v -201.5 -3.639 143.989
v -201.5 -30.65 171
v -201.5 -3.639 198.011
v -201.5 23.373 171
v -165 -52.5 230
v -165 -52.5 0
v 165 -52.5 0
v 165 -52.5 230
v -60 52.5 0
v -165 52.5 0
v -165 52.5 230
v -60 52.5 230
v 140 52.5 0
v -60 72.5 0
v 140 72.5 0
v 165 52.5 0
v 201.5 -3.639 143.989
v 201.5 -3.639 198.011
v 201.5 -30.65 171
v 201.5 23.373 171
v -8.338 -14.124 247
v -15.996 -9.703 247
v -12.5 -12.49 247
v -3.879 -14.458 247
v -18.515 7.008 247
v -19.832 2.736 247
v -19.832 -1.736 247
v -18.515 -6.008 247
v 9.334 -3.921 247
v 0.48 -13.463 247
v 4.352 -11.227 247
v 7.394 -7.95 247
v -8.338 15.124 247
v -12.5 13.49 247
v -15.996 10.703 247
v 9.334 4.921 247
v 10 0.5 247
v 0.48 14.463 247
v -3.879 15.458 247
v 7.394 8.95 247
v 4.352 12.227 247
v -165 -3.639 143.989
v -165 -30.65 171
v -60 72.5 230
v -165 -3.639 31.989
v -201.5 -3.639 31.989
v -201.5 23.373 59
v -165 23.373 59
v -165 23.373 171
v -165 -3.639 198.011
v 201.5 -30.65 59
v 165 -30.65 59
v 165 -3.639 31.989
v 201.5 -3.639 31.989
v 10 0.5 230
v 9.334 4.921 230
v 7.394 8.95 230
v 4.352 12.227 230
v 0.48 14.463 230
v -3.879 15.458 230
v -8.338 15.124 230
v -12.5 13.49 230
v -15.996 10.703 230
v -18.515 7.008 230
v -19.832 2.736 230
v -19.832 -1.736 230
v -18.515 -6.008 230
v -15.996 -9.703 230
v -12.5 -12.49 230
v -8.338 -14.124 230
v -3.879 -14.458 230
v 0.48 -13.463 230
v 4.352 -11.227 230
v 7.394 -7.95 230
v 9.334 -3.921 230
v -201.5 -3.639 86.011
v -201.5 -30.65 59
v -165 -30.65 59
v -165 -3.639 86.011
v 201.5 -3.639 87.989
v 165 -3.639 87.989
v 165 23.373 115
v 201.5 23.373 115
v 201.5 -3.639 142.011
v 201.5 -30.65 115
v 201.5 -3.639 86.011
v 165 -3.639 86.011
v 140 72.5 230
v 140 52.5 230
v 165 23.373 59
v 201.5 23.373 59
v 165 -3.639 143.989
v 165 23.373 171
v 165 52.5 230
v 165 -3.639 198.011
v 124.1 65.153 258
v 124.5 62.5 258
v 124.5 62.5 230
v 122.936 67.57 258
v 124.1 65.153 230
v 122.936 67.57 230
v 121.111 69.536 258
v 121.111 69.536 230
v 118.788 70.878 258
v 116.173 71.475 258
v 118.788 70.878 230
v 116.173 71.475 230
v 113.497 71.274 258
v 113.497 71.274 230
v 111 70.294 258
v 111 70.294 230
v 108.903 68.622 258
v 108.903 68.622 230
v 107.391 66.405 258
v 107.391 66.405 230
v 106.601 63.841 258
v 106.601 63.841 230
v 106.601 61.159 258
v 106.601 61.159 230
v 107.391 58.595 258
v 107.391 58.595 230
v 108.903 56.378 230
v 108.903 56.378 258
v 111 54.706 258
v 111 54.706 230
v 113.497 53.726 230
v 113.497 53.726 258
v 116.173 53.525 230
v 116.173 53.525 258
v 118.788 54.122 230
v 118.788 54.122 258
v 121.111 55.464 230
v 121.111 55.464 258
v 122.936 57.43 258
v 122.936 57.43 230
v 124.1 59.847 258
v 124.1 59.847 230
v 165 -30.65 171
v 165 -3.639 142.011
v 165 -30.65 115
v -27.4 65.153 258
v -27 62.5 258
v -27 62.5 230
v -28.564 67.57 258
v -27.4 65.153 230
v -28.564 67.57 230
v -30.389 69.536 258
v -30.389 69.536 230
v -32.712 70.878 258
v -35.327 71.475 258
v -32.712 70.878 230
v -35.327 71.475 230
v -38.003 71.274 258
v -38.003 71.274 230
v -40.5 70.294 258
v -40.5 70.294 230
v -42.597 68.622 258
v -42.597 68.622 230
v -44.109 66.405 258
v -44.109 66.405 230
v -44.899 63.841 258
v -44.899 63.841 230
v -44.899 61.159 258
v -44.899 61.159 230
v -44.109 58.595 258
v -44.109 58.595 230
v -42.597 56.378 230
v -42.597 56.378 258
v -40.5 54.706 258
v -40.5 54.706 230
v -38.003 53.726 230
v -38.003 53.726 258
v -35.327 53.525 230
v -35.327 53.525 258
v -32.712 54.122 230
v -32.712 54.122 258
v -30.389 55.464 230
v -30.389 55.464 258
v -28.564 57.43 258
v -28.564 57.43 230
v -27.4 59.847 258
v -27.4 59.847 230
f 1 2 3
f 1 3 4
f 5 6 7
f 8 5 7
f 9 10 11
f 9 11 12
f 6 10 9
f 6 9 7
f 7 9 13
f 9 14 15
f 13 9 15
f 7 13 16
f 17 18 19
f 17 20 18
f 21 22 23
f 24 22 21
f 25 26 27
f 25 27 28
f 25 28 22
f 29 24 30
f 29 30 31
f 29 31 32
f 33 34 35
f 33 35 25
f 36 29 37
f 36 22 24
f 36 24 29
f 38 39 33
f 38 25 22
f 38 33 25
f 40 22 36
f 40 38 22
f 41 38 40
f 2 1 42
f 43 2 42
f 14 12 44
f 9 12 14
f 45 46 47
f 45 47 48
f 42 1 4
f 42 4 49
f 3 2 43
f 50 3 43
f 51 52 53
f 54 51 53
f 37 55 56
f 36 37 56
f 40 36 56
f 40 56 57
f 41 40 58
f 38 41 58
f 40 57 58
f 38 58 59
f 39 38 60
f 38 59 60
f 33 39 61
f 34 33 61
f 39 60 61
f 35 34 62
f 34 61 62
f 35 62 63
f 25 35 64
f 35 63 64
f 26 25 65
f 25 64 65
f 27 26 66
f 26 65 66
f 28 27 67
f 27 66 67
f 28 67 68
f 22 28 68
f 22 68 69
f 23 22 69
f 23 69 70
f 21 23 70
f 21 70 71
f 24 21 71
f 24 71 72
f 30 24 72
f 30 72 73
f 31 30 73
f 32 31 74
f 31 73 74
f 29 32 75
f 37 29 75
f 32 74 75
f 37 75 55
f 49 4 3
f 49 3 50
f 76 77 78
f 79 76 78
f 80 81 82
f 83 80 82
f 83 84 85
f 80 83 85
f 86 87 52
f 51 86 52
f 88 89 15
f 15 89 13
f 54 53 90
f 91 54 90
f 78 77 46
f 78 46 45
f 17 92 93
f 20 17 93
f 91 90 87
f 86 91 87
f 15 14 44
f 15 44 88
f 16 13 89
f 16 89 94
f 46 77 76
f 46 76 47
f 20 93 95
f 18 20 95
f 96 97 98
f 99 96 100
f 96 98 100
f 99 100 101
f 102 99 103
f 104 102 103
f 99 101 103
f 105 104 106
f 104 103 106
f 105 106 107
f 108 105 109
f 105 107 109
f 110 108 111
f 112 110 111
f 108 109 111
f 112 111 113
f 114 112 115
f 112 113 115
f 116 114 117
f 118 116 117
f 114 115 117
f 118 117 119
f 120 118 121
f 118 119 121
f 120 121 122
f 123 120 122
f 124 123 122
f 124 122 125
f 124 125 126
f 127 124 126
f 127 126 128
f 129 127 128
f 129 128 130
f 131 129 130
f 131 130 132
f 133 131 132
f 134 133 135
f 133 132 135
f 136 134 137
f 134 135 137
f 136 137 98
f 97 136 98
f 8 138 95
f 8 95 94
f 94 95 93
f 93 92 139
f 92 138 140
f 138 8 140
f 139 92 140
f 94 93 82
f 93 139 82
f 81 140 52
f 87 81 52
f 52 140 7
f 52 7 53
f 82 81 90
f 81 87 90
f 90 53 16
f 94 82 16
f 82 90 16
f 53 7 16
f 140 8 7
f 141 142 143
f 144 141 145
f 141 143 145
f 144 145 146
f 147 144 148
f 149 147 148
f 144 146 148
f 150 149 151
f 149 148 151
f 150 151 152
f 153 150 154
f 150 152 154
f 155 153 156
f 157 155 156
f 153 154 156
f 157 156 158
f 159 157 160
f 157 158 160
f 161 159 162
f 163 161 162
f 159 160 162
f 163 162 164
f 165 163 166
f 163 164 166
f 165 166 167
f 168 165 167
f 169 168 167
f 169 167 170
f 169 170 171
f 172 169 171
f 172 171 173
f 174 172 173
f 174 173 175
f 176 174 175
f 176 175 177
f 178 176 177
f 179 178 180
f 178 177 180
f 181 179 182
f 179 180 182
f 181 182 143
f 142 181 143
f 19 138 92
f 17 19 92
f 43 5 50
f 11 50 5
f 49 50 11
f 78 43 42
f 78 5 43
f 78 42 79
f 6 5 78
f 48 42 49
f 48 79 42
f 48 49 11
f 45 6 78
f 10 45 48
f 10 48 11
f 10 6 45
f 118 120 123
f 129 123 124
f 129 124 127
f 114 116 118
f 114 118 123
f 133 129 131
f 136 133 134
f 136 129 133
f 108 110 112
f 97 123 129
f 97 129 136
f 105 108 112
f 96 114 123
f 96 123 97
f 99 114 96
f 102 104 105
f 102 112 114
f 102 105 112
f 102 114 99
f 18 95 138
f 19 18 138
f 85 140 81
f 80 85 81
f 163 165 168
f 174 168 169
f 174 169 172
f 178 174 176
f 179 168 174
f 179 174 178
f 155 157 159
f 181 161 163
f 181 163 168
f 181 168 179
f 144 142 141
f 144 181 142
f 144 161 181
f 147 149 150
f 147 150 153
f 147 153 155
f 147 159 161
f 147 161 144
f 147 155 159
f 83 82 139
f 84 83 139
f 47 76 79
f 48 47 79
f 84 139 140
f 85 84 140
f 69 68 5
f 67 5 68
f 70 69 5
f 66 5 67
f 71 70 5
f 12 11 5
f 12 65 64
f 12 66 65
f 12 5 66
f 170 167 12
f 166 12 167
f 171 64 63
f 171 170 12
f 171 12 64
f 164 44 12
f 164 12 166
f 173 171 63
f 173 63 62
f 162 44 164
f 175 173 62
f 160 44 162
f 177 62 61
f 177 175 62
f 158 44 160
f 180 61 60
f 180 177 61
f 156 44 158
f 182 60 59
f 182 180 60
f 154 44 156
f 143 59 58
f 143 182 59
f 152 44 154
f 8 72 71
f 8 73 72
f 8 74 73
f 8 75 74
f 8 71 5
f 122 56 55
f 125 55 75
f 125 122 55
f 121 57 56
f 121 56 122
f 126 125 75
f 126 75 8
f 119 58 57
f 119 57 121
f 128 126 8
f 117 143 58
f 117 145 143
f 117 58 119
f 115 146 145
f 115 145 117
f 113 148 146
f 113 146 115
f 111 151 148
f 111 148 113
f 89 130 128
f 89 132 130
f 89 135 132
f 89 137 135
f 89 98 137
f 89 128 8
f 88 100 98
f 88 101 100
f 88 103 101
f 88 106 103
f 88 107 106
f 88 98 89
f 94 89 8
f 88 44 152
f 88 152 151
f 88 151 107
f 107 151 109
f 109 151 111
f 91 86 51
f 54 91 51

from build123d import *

# Parameters (mm, degrees)
SKETCH1_W           = 330
SKETCH1_H           = 105
BOSS_EXTRUDE1_DEPTH = 230
SKETCH2_W           = 200
SKETCH2_H           = 230
BOSS_EXTRUDE2_DEPTH = 20
SKETCH5_R           = 9
BOSS_EXTRUDE4_DEPTH = 28
SKETCH5_5_R         = 15
BOSS_EXTRUDE5_DEPTH = 17
BOSS_EXTRUDE6_DEPTH = 36.5
MIRROR1_START       = 20.04628694
MIRROR1_OUTLINE_W   = 36.5
MIRROR1_OUTLINE_H   = 38.2
MIRROR1_DEPTH       = 38.2
MIRROR1_START_2     = 99.242246433
MIRROR1_2_OUTLINE_W = 36.5
MIRROR1_2_OUTLINE_H = 38.2
MIRROR1_2_DEPTH     = 38.2


# Read off the part's stored shape, not the designer's step: Mirror1
with BuildPart() as part:
    # Sketch1 → Boss-Extrude1 (new body)
    with BuildSketch(Plane.XY):
        Rectangle(SKETCH1_W, SKETCH1_H)
    extrude(amount=BOSS_EXTRUDE1_DEPTH)

    # Sketch2 → Boss-Extrude2 (add)
    with BuildSketch(Plane(origin=(0, 52.5, 0), x_dir=(1, 0, 0), z_dir=(0, 1, 0))):
        with Locations((40, -115)):
            Rectangle(SKETCH2_W, SKETCH2_H)
    extrude(amount=BOSS_EXTRUDE2_DEPTH)

    # Sketch5 → Boss-Extrude4 (add)
    with BuildSketch(Plane.XY.offset(230)):
        with Locations((115.5, 62.5)):
            Circle(SKETCH5_R)
        with Locations((-36, 62.5)):
            Circle(SKETCH5_R)
    extrude(amount=BOSS_EXTRUDE4_DEPTH)

    # Sketch5<5> → Boss-Extrude5 (add)
    with BuildSketch(Plane.XY.offset(230)):
        with Locations((-5, 0.5)):
            Circle(SKETCH5_5_R)
    extrude(amount=BOSS_EXTRUDE5_DEPTH)

    # Sketch6 → Boss-Extrude6 (add)
    with BuildSketch(Plane(origin=(165, 0, 0), x_dir=(0, 0, -1), z_dir=(1, 0, 0))):
        Polygon((-86.011479041, -3.638790093), (-59, -30.650269134), (-31.988520959, -3.638790093), (-59, 23.372688948), align=None)
        Polygon((-142.011479041, -3.638790093), (-115, -30.650269134), (-87.988520959, -3.638790093), (-115, 23.372688948), align=None)
        Polygon((-198.011479041, -3.638790093), (-171, -30.650269134), (-143.988520959, -3.638790093), (-171, 23.372688948), align=None)
    extrude(amount=BOSS_EXTRUDE6_DEPTH)

    # Mirror1 outline → Mirror1 (add)
    with BuildSketch(Plane(origin=(0, 0, 0), x_dir=(1, 0, 0), z_dir=(0, 0.707106781186546, 0.707106781186549)).offset(MIRROR1_START)):
        with Locations((-183.25, -44.29231324)):
            Rectangle(MIRROR1_OUTLINE_W, MIRROR1_OUTLINE_H)
    extrude(amount=MIRROR1_DEPTH)

    # Mirror1 2 outline → Mirror1 2 (add)
    with BuildSketch(Plane(origin=(0, 0, 0), x_dir=(1, 0, 0), z_dir=(0, 0.707106781186546, 0.707106781186549)).offset(MIRROR1_START_2)):
        with Locations((-183.25, -123.488272733)):
            Rectangle(MIRROR1_2_OUTLINE_W, MIRROR1_2_OUTLINE_H)
    extrude(amount=MIRROR1_2_DEPTH)


solid = part.part
